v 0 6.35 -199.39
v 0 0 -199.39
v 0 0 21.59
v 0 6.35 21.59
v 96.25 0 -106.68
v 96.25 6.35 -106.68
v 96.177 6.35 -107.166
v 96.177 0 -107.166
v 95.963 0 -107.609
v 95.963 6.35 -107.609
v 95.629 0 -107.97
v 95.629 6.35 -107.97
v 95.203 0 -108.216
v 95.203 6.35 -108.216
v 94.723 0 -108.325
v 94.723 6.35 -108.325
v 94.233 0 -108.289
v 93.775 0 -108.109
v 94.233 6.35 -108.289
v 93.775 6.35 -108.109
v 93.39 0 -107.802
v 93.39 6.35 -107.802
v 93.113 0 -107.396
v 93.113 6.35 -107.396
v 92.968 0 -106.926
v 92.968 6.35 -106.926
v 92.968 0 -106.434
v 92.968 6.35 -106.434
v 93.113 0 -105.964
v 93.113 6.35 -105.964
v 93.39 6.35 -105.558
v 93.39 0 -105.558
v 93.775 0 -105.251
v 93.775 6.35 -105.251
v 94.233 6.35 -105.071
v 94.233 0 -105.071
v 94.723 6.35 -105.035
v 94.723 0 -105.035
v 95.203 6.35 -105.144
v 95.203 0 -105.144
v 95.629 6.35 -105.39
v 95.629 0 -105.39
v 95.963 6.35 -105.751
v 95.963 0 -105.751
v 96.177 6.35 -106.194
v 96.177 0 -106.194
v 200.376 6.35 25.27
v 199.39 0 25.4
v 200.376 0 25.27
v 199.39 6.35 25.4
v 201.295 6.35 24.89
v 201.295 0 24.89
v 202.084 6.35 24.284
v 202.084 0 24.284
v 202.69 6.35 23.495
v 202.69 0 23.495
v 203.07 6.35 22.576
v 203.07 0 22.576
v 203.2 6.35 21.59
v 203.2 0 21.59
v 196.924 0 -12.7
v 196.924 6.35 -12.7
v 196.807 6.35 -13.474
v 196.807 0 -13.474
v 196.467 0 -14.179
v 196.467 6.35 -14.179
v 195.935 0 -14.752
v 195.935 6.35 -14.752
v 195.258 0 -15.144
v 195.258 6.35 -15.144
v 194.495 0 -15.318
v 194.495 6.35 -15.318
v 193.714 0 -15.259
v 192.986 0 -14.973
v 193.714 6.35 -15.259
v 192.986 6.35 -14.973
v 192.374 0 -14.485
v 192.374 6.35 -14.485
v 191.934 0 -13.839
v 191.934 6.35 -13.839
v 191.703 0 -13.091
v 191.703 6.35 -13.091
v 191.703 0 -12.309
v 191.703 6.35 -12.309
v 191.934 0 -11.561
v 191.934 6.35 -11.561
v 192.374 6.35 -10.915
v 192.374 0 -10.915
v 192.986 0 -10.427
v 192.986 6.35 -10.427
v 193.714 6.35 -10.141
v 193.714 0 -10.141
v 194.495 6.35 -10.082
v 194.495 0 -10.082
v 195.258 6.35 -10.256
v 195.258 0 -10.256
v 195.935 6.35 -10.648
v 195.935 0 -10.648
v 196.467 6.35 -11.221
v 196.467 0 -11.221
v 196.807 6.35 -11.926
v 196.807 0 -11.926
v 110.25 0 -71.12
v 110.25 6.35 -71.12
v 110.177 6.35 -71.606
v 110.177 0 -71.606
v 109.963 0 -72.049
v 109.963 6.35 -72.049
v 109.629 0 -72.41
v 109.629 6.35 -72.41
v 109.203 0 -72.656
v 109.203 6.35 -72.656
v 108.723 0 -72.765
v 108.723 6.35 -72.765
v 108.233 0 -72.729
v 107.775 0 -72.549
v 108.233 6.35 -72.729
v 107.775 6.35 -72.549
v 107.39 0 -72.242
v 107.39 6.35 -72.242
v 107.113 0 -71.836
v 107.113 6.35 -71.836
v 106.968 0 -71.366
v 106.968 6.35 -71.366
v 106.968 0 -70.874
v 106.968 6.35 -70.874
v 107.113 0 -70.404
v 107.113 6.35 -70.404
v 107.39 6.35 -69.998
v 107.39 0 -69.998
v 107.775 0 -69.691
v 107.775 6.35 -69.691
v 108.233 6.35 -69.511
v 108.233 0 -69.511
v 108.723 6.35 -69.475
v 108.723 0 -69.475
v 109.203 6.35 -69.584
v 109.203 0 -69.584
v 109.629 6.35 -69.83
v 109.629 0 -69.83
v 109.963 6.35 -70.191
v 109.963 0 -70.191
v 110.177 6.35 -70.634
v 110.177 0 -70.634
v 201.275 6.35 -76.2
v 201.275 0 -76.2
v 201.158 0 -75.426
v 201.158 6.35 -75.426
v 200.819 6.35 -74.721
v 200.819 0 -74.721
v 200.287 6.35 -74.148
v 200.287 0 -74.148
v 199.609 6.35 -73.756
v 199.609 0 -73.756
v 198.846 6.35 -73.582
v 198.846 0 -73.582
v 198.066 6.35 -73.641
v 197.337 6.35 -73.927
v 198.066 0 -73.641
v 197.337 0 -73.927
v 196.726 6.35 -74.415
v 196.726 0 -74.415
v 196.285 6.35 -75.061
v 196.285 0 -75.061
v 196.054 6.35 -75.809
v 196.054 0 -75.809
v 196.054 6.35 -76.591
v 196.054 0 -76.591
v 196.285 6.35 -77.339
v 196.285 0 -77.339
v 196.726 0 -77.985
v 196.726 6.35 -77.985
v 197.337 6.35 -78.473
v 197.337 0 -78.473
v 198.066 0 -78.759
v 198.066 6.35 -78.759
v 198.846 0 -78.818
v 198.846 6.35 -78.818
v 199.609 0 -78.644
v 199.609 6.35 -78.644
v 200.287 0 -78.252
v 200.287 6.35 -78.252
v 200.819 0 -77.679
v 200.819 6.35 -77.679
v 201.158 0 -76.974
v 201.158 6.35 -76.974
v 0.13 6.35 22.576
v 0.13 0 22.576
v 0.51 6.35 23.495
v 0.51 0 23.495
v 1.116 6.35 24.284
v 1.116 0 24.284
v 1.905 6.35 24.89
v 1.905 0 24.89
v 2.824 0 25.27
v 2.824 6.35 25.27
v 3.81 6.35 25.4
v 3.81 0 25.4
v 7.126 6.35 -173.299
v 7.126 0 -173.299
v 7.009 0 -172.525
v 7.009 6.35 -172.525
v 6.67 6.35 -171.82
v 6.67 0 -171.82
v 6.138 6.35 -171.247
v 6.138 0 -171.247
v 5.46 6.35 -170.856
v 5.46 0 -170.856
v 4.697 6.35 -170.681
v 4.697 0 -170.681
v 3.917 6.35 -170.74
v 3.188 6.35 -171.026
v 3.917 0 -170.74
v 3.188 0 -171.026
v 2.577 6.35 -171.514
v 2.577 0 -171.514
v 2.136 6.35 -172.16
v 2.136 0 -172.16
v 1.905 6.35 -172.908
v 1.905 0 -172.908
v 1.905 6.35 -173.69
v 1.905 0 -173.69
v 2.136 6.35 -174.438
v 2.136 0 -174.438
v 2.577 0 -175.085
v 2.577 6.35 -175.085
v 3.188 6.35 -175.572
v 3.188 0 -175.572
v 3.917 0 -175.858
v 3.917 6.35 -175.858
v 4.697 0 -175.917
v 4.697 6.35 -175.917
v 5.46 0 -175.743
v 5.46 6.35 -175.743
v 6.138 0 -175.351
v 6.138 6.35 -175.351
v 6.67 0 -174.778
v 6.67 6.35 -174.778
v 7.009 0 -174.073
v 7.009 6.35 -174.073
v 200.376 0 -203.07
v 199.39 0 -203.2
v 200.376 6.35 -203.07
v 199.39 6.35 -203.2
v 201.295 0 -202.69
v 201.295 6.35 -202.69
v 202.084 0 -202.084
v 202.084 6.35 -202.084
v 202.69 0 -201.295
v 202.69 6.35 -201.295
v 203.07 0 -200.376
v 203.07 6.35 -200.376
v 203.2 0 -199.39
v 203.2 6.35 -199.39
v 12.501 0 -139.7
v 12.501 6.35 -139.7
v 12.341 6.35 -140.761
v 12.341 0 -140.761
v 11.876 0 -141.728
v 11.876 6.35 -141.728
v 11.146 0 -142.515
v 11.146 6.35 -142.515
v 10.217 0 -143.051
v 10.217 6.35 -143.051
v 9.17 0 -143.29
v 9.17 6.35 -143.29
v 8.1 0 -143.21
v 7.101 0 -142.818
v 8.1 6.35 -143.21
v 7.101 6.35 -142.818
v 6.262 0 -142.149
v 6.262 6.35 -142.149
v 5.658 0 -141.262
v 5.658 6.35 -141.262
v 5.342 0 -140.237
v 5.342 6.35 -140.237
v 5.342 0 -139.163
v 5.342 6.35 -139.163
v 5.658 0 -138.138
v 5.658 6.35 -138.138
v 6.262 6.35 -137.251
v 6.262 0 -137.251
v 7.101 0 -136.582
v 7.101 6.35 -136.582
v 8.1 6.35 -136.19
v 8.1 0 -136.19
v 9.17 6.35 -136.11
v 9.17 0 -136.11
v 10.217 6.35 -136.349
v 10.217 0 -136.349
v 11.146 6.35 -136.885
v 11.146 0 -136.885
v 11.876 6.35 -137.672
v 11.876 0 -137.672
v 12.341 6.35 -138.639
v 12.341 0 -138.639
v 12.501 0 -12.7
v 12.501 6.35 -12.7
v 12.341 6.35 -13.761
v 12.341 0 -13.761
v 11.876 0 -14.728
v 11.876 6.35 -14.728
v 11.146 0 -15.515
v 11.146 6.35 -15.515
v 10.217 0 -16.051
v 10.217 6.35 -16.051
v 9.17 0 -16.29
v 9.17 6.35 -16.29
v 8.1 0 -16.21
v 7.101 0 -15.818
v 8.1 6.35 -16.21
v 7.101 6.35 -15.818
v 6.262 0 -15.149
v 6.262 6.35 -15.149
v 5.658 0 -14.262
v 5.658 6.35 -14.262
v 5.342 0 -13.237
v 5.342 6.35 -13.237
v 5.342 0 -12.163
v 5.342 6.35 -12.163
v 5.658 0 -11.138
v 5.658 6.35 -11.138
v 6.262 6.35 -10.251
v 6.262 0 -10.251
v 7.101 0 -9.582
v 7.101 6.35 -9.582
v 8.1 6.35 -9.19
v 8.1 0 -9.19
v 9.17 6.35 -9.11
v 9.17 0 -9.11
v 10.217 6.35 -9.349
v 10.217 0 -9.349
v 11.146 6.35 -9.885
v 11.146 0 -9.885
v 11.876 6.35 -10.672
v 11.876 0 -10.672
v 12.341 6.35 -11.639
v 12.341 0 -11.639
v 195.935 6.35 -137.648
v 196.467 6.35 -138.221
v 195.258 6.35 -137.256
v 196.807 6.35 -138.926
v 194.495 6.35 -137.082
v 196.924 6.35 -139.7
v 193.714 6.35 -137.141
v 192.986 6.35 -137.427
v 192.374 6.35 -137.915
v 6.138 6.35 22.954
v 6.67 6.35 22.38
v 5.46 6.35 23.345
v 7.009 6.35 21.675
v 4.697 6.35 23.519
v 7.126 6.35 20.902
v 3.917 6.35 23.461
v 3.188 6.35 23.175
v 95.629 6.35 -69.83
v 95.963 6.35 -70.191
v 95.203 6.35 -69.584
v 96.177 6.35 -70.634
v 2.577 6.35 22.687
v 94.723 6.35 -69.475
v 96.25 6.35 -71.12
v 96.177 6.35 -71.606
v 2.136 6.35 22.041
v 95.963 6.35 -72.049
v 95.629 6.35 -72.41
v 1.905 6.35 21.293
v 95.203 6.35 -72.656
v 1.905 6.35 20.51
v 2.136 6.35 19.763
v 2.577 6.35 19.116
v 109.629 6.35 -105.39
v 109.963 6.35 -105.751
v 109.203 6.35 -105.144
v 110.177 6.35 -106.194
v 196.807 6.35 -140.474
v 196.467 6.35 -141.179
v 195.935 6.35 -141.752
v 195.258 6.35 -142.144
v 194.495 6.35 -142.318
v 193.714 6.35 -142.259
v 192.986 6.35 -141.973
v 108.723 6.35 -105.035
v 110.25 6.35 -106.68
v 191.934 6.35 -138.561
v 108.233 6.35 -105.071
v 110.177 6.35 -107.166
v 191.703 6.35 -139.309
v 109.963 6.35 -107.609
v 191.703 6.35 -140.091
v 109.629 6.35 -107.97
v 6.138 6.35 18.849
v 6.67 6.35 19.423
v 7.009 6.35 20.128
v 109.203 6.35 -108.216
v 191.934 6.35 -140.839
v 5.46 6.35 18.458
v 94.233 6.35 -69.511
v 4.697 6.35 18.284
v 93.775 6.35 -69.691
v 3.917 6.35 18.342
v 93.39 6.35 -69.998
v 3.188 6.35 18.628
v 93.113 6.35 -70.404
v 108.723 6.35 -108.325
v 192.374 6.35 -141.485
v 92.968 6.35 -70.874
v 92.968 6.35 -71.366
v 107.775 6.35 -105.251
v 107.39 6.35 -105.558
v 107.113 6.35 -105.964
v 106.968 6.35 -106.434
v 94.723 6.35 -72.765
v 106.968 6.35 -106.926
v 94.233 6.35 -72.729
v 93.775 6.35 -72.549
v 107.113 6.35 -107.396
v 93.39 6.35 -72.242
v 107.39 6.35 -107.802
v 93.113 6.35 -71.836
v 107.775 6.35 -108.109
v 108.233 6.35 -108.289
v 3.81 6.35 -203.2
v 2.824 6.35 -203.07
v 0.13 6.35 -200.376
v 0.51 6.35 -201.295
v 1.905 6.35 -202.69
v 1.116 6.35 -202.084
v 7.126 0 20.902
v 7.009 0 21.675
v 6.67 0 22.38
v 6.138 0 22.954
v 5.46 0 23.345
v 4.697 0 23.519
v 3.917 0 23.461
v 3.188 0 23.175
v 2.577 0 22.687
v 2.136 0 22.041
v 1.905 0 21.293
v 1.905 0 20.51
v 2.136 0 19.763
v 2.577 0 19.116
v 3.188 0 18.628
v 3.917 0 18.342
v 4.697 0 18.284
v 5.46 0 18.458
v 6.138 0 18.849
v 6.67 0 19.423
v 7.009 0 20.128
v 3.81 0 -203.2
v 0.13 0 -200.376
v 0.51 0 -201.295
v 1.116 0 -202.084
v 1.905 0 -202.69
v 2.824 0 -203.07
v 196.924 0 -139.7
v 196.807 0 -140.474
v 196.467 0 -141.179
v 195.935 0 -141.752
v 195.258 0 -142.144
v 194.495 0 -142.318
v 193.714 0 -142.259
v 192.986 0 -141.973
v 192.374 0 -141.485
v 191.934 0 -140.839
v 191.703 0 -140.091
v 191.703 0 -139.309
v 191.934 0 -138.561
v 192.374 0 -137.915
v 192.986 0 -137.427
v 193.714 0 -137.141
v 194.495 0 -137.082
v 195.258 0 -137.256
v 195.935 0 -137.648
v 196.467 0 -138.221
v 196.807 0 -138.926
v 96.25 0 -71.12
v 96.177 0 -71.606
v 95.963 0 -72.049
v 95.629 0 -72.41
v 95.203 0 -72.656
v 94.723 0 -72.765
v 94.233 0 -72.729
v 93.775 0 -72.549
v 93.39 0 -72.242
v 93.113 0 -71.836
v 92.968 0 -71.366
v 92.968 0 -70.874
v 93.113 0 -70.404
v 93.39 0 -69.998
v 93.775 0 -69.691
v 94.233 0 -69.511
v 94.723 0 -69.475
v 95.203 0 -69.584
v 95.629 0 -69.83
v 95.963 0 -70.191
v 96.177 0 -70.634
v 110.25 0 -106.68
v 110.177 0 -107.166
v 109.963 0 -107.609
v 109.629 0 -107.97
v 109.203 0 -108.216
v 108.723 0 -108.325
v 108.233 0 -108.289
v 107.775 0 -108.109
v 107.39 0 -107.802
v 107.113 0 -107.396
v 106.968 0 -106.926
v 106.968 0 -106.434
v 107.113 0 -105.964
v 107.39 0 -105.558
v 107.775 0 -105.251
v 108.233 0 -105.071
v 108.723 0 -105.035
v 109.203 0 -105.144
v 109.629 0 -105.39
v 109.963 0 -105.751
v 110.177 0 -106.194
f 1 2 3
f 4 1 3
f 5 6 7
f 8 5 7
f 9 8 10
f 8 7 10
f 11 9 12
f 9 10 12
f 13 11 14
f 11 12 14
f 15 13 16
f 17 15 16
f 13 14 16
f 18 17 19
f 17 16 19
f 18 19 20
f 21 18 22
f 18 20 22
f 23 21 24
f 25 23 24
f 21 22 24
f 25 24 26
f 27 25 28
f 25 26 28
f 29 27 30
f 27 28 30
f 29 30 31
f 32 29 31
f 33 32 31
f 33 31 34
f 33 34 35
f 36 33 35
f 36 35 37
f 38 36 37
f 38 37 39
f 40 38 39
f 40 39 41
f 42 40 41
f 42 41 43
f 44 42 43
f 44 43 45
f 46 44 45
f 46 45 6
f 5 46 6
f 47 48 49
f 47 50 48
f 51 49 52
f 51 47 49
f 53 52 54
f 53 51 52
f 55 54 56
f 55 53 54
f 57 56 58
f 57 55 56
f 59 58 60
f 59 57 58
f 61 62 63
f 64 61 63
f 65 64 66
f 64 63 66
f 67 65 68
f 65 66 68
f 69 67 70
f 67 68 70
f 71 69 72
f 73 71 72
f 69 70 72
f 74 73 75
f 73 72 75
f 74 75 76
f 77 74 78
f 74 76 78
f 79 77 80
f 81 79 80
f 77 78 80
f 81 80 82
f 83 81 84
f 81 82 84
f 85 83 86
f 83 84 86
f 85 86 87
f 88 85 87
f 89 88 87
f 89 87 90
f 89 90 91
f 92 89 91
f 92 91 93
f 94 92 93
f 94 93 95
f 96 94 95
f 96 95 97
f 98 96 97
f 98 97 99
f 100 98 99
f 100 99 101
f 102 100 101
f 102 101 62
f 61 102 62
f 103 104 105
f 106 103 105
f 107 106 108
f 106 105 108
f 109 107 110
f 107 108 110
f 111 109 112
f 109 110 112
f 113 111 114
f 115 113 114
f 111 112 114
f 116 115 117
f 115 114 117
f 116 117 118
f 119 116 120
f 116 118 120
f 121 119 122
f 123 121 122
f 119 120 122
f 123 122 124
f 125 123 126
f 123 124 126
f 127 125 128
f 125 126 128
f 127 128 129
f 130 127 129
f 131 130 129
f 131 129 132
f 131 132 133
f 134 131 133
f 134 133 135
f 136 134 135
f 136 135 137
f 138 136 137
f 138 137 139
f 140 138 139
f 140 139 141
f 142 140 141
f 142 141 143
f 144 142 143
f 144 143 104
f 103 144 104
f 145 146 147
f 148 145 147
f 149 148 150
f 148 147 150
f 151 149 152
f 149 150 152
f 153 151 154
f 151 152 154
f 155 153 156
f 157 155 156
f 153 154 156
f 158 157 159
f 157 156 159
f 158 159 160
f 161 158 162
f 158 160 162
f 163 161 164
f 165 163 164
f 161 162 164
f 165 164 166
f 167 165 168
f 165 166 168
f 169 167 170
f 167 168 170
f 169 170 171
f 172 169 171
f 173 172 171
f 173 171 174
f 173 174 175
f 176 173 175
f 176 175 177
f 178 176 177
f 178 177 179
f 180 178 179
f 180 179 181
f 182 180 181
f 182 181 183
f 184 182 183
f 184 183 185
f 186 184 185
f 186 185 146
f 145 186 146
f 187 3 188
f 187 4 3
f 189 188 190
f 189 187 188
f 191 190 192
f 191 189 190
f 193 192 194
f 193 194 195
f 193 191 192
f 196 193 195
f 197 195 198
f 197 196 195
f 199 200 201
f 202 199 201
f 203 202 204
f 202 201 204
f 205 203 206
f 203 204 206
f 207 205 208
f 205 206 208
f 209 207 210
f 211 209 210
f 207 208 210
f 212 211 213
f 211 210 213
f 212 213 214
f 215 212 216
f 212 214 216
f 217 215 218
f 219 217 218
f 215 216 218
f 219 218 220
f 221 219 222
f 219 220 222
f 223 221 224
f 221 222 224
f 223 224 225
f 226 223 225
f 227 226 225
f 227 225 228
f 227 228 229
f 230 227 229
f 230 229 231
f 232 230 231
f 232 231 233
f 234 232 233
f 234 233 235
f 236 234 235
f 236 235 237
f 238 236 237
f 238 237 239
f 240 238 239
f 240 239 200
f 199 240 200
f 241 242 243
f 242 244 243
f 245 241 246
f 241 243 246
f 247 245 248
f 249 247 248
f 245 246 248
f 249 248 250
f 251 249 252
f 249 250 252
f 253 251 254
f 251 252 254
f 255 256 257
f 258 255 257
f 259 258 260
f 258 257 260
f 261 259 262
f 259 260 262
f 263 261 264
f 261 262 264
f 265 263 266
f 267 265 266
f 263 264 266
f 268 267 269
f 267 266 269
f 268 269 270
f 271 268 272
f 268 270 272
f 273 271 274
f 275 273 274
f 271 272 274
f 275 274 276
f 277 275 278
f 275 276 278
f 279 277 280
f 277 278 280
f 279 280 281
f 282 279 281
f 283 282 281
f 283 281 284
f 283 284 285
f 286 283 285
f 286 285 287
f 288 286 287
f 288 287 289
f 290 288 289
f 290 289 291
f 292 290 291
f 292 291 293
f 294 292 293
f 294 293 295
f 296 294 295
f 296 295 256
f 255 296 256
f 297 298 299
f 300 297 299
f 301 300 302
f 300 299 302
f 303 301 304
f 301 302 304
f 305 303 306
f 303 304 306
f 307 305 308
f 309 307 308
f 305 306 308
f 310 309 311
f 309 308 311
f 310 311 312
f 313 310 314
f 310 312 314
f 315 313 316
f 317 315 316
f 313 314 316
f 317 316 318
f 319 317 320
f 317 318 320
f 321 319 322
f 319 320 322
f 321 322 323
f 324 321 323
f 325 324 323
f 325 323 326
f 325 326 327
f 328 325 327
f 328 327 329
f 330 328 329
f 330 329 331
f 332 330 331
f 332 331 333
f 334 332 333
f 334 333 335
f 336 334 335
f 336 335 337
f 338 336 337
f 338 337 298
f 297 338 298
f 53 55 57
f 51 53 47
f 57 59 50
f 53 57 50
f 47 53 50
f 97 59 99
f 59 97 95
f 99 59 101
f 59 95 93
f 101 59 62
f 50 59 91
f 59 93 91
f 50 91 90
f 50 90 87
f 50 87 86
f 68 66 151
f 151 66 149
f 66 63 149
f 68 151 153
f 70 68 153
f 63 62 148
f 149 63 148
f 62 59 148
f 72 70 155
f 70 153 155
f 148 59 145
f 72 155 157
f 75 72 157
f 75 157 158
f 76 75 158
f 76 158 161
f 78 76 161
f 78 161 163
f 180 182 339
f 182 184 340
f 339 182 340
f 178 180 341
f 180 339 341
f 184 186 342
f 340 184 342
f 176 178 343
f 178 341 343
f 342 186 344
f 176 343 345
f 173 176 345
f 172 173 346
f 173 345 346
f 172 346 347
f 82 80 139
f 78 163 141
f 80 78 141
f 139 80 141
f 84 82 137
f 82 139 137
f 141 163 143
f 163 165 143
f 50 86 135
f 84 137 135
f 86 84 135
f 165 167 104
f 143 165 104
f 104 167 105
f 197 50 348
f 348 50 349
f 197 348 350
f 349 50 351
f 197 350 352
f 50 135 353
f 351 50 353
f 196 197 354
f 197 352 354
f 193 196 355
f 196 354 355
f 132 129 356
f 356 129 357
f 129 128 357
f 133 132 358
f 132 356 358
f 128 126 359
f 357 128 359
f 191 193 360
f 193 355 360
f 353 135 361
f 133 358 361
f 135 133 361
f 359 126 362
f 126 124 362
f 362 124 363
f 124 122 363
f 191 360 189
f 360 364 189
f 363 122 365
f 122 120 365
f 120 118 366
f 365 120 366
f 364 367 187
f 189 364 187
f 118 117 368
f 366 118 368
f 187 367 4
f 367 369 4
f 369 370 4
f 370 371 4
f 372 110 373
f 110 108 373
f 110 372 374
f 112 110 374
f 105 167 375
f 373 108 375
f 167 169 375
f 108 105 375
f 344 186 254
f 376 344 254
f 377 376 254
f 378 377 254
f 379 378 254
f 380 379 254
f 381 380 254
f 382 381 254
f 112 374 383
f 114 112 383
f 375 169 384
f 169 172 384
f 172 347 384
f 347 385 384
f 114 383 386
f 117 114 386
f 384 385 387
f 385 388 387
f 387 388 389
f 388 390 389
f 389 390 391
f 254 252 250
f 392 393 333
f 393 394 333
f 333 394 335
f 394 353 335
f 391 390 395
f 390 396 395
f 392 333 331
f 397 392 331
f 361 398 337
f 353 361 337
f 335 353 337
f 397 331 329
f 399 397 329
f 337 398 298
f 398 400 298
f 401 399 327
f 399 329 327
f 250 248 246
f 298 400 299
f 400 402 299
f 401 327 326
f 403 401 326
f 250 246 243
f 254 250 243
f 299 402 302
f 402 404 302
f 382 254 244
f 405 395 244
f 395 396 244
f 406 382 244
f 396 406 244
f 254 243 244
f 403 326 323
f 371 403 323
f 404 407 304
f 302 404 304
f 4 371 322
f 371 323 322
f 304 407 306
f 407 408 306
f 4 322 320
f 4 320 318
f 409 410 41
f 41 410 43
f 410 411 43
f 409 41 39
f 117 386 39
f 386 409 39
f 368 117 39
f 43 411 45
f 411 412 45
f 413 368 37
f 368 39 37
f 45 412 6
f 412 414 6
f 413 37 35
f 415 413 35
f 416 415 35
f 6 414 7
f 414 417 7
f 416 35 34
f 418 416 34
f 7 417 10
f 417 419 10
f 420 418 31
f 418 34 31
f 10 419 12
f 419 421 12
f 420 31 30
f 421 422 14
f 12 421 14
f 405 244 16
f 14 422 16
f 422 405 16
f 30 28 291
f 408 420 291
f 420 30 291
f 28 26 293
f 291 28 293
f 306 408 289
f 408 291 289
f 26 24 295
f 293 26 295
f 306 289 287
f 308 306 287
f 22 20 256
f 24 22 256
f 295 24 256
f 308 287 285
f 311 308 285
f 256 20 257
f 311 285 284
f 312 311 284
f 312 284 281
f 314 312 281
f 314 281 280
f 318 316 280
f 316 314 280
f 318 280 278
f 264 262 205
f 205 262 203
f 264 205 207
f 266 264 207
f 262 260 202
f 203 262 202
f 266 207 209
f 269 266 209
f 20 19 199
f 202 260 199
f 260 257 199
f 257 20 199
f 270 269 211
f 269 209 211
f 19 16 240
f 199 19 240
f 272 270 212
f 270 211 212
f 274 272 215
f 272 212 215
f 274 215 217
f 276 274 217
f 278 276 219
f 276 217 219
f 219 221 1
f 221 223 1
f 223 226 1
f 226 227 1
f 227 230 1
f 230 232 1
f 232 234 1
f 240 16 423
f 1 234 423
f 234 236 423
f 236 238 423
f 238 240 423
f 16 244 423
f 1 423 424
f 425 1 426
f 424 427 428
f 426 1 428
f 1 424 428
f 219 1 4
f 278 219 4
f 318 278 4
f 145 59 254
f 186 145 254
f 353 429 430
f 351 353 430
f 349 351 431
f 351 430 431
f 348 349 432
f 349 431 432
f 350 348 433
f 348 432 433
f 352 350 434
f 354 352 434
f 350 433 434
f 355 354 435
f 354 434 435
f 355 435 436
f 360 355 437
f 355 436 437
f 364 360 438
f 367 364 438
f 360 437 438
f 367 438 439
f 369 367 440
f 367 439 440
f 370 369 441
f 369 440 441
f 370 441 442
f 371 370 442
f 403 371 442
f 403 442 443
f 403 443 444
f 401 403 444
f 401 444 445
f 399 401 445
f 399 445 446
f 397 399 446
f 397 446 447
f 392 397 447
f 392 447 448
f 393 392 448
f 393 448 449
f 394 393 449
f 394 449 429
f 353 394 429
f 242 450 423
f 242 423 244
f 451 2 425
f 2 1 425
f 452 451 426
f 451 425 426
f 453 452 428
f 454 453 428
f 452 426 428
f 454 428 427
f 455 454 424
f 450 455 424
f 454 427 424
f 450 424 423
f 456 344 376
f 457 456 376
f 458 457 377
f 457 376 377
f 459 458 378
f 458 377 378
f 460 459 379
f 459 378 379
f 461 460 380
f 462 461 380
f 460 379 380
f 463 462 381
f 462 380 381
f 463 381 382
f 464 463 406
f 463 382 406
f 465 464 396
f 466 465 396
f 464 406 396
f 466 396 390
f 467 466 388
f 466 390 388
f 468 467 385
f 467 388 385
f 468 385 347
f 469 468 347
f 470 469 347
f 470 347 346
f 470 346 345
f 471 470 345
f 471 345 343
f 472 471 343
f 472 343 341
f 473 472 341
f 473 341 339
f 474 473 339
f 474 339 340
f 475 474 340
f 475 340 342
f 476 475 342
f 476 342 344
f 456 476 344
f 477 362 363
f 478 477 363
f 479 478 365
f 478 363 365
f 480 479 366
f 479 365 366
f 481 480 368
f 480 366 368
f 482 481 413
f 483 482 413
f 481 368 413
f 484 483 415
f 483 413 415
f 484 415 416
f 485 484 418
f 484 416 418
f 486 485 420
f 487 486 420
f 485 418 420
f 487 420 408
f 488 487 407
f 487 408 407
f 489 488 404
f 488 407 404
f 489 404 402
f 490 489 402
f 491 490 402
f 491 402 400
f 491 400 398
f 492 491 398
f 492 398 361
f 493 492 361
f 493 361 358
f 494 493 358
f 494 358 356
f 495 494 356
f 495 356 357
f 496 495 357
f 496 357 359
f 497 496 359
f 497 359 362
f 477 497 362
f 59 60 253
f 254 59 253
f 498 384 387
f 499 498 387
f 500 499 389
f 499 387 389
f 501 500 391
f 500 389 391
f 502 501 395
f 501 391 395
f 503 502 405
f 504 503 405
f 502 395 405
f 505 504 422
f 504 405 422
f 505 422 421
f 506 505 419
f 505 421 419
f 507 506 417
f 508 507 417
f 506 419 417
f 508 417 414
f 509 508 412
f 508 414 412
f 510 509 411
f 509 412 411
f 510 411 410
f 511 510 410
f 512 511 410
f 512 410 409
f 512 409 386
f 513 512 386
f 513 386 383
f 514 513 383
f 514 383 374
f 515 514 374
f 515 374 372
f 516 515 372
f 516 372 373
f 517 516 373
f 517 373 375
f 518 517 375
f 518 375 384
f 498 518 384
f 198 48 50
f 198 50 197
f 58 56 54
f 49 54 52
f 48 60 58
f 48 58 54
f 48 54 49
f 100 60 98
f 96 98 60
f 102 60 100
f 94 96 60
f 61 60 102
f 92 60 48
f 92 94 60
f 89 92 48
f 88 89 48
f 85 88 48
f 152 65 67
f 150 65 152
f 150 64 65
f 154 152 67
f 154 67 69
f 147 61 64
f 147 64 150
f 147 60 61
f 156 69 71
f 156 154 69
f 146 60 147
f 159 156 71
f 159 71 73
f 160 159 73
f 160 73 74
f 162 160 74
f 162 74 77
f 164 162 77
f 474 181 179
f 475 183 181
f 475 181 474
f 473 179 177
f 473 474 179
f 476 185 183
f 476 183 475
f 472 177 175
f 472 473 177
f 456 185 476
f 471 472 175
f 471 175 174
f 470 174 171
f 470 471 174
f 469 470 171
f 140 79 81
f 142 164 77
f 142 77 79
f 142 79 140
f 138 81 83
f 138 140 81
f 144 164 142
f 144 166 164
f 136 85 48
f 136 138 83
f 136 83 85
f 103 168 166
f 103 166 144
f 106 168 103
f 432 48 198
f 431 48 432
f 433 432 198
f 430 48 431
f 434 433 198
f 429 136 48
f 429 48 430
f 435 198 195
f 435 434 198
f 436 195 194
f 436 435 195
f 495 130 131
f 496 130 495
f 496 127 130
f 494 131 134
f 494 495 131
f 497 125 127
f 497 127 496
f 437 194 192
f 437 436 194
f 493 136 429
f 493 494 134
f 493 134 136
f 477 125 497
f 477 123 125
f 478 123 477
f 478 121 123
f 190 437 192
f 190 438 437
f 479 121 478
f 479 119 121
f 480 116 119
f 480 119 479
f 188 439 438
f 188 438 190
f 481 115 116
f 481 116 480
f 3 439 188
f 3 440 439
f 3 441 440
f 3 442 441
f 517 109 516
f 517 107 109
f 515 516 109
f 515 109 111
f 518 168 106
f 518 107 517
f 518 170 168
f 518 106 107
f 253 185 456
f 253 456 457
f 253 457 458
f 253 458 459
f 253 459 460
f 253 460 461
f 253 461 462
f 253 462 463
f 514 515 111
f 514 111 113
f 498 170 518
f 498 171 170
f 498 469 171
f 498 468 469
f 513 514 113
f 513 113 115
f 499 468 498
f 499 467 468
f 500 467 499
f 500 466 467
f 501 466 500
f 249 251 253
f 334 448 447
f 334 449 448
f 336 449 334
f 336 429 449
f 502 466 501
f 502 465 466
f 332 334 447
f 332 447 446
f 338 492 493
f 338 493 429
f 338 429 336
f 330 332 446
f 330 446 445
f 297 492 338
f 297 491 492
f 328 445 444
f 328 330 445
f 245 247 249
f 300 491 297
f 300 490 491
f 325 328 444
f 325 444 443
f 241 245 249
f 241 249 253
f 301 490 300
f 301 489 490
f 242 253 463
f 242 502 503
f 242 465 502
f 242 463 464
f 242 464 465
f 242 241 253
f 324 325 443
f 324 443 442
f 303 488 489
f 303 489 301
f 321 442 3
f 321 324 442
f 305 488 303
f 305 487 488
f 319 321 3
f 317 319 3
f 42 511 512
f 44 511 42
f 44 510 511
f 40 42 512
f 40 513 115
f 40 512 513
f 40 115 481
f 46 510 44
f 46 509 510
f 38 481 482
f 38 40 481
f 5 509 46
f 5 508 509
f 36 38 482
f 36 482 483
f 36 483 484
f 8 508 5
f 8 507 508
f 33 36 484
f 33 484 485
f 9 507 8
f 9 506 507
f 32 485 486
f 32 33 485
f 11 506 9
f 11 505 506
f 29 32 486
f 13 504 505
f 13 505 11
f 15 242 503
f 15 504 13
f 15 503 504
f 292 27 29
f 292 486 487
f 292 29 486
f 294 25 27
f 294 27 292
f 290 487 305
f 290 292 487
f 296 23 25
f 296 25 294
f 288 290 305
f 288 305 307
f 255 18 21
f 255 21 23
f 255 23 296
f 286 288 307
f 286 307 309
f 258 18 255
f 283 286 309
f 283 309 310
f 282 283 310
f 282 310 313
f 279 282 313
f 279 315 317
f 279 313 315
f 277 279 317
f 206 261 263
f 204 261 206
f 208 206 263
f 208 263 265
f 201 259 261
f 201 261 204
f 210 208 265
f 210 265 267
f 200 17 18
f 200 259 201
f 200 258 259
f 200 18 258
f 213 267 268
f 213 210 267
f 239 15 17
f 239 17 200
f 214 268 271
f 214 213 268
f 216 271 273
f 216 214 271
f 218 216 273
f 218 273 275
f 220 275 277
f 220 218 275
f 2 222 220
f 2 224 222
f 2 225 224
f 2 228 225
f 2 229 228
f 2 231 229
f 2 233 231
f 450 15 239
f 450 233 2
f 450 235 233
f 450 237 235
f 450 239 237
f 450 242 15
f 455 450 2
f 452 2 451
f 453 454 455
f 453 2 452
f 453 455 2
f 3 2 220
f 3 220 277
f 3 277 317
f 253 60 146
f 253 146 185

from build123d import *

# Parameters (mm, degrees)
BOSS_EXTRUDE1_DEPTH     = 6.35
WHEEL_HOLES_REACH       = 8.35
SKETCH2_R               = 3.6
SKETCH2_R_2             = 2.625
BUILD_PLATE_HOLES_REACH = 8.35
SKETCH3_R               = 2.625
FILLET1_R               = 3.81
BELT_CLAMP_HOLES_REACH  = 8.35
SKETCH4_R               = 1.65


with BuildPart() as part:
    # Sketch1 → Boss-Extrude1 (new body)
    with BuildSketch(Plane(origin=(0, 0, 0), x_dir=(1, 0, 0), z_dir=(0, 1, 0))):
        Polygon((0, 0), (0, 203.2), (203.2, 203.2), (203.2, 0), (203.2, -25.4), (0, -25.4), align=None)
    extrude(amount=BOSS_EXTRUDE1_DEPTH)

    # Sketch2 → wheel holes (cut, up to next)
    with BuildSketch(Plane(origin=(0, 6.35, 0), x_dir=(1, 0, 0), z_dir=(0, 1, 0)), mode=Mode.PRIVATE) as wheel_holes_sk1:
        with Locations((8.90143, 12.7)):
            Circle(SKETCH2_R)
    wheel_holes_tool1 = extrude(wheel_holes_sk1.sketch, amount=-WHEEL_HOLES_REACH, mode=Mode.PRIVATE) & part.part
    add(wheel_holes_tool1.solids().sort_by_distance((8.90143, 6.35, -12.7))[0], mode=Mode.SUBTRACT)
    # Sketch2 → wheel holes (cut, up to next)
    with BuildSketch(Plane(origin=(0, 6.35, 0), x_dir=(1, 0, 0), z_dir=(0, 1, 0)), mode=Mode.PRIVATE) as wheel_holes_sk2:
        with Locations((8.90143, 139.7)):
            Circle(SKETCH2_R)
    wheel_holes_tool2 = extrude(wheel_holes_sk2.sketch, amount=-WHEEL_HOLES_REACH, mode=Mode.PRIVATE) & part.part
    add(wheel_holes_tool2.solids().sort_by_distance((8.90143, 6.35, -139.7))[0], mode=Mode.SUBTRACT)
    # Sketch2 → wheel holes (cut, up to next)
    with BuildSketch(Plane(origin=(0, 6.35, 0), x_dir=(1, 0, 0), z_dir=(0, 1, 0)), mode=Mode.PRIVATE) as wheel_holes_sk3:
        with Locations((194.29857, 12.7)):
            Circle(SKETCH2_R_2)
    wheel_holes_tool3 = extrude(wheel_holes_sk3.sketch, amount=-WHEEL_HOLES_REACH, mode=Mode.PRIVATE) & part.part
    add(wheel_holes_tool3.solids().sort_by_distance((194.29857, 6.35, -12.7))[0], mode=Mode.SUBTRACT)
    # Sketch2 → wheel holes (cut, up to next)
    with BuildSketch(Plane(origin=(0, 6.35, 0), x_dir=(1, 0, 0), z_dir=(0, 1, 0)), mode=Mode.PRIVATE) as wheel_holes_sk4:
        with Locations((194.29857, 139.7)):
            Circle(SKETCH2_R_2)
    wheel_holes_tool4 = extrude(wheel_holes_sk4.sketch, amount=-WHEEL_HOLES_REACH, mode=Mode.PRIVATE) & part.part
    add(wheel_holes_tool4.solids().sort_by_distance((194.29857, 6.35, -139.7))[0], mode=Mode.SUBTRACT)

    # Sketch3 → build plate holes (cut, up to next)
    with BuildSketch(Plane.XZ, mode=Mode.PRIVATE) as build_plate_holes_sk1:
        with Locations((4.50088, 20.90166)):
            Circle(SKETCH3_R)
    build_plate_holes_tool1 = extrude(build_plate_holes_sk1.sketch, amount=-BUILD_PLATE_HOLES_REACH, mode=Mode.PRIVATE) & part.part
    add(build_plate_holes_tool1.solids().sort_by_distance((4.50088, 0, 20.90166))[0], mode=Mode.SUBTRACT)
    # Sketch3 → build plate holes (cut, up to next)
    with BuildSketch(Plane.XZ, mode=Mode.PRIVATE) as build_plate_holes_sk2:
        with Locations((4.50088, -173.29912)):
            Circle(SKETCH3_R)
    build_plate_holes_tool2 = extrude(build_plate_holes_sk2.sketch, amount=-BUILD_PLATE_HOLES_REACH, mode=Mode.PRIVATE) & part.part
    add(build_plate_holes_tool2.solids().sort_by_distance((4.50088, 0, -173.29912))[0], mode=Mode.SUBTRACT)
    # Sketch3 → build plate holes (cut, up to next)
    with BuildSketch(Plane.XZ, mode=Mode.PRIVATE) as build_plate_holes_sk3:
        with Locations((198.6499964, -76.2)):
            Circle(SKETCH3_R)
    build_plate_holes_tool3 = extrude(build_plate_holes_sk3.sketch, amount=-BUILD_PLATE_HOLES_REACH, mode=Mode.PRIVATE) & part.part
    add(build_plate_holes_tool3.solids().sort_by_distance((198.649996, 0, -76.2))[0], mode=Mode.SUBTRACT)

    # Fillet1
    fillet1_edges = [part.edges().sort_by_distance(p)[0] for p in [
        (0, 3.175, -203.2),
        (203.2, 3.175, -203.2),
        (203.2, 3.175, 25.4),
        (0, 3.175, 25.4),
    ]]
    fillet(fillet1_edges, radius=FILLET1_R)

    # Sketch4 → belt clamp holes (cut, up to next)
    with BuildSketch(Plane(origin=(0, 6.35, 0), x_dir=(1, 0, 0), z_dir=(0, 1, 0)), mode=Mode.PRIVATE) as belt_clamp_holes_sk1:
        with Locations((94.6, 106.68)):
            Circle(SKETCH4_R)
    belt_clamp_holes_tool1 = extrude(belt_clamp_holes_sk1.sketch, amount=-BELT_CLAMP_HOLES_REACH, mode=Mode.PRIVATE) & part.part
    add(belt_clamp_holes_tool1.solids().sort_by_distance((94.6, 6.35, -106.68))[0], mode=Mode.SUBTRACT)
    # Sketch4 → belt clamp holes (cut, up to next)
    with BuildSketch(Plane(origin=(0, 6.35, 0), x_dir=(1, 0, 0), z_dir=(0, 1, 0)), mode=Mode.PRIVATE) as belt_clamp_holes_sk2:
        with Locations((108.6, 106.68)):
            Circle(SKETCH4_R)
    belt_clamp_holes_tool2 = extrude(belt_clamp_holes_sk2.sketch, amount=-BELT_CLAMP_HOLES_REACH, mode=Mode.PRIVATE) & part.part
    add(belt_clamp_holes_tool2.solids().sort_by_distance((108.6, 6.35, -106.68))[0], mode=Mode.SUBTRACT)
    # Sketch4 → belt clamp holes (cut, up to next)
    with BuildSketch(Plane(origin=(0, 6.35, 0), x_dir=(1, 0, 0), z_dir=(0, 1, 0)), mode=Mode.PRIVATE) as belt_clamp_holes_sk3:
        with Locations((108.6, 71.12)):
            Circle(SKETCH4_R)
    belt_clamp_holes_tool3 = extrude(belt_clamp_holes_sk3.sketch, amount=-BELT_CLAMP_HOLES_REACH, mode=Mode.PRIVATE) & part.part
    add(belt_clamp_holes_tool3.solids().sort_by_distance((108.6, 6.35, -71.12))[0], mode=Mode.SUBTRACT)
    # Sketch4 → belt clamp holes (cut, up to next)
    with BuildSketch(Plane(origin=(0, 6.35, 0), x_dir=(1, 0, 0), z_dir=(0, 1, 0)), mode=Mode.PRIVATE) as belt_clamp_holes_sk4:
        with Locations((94.6, 71.12)):
            Circle(SKETCH4_R)
    belt_clamp_holes_tool4 = extrude(belt_clamp_holes_sk4.sketch, amount=-BELT_CLAMP_HOLES_REACH, mode=Mode.PRIVATE) & part.part
    add(belt_clamp_holes_tool4.solids().sort_by_distance((94.6, 6.35, -71.12))[0], mode=Mode.SUBTRACT)


solid = part.part
